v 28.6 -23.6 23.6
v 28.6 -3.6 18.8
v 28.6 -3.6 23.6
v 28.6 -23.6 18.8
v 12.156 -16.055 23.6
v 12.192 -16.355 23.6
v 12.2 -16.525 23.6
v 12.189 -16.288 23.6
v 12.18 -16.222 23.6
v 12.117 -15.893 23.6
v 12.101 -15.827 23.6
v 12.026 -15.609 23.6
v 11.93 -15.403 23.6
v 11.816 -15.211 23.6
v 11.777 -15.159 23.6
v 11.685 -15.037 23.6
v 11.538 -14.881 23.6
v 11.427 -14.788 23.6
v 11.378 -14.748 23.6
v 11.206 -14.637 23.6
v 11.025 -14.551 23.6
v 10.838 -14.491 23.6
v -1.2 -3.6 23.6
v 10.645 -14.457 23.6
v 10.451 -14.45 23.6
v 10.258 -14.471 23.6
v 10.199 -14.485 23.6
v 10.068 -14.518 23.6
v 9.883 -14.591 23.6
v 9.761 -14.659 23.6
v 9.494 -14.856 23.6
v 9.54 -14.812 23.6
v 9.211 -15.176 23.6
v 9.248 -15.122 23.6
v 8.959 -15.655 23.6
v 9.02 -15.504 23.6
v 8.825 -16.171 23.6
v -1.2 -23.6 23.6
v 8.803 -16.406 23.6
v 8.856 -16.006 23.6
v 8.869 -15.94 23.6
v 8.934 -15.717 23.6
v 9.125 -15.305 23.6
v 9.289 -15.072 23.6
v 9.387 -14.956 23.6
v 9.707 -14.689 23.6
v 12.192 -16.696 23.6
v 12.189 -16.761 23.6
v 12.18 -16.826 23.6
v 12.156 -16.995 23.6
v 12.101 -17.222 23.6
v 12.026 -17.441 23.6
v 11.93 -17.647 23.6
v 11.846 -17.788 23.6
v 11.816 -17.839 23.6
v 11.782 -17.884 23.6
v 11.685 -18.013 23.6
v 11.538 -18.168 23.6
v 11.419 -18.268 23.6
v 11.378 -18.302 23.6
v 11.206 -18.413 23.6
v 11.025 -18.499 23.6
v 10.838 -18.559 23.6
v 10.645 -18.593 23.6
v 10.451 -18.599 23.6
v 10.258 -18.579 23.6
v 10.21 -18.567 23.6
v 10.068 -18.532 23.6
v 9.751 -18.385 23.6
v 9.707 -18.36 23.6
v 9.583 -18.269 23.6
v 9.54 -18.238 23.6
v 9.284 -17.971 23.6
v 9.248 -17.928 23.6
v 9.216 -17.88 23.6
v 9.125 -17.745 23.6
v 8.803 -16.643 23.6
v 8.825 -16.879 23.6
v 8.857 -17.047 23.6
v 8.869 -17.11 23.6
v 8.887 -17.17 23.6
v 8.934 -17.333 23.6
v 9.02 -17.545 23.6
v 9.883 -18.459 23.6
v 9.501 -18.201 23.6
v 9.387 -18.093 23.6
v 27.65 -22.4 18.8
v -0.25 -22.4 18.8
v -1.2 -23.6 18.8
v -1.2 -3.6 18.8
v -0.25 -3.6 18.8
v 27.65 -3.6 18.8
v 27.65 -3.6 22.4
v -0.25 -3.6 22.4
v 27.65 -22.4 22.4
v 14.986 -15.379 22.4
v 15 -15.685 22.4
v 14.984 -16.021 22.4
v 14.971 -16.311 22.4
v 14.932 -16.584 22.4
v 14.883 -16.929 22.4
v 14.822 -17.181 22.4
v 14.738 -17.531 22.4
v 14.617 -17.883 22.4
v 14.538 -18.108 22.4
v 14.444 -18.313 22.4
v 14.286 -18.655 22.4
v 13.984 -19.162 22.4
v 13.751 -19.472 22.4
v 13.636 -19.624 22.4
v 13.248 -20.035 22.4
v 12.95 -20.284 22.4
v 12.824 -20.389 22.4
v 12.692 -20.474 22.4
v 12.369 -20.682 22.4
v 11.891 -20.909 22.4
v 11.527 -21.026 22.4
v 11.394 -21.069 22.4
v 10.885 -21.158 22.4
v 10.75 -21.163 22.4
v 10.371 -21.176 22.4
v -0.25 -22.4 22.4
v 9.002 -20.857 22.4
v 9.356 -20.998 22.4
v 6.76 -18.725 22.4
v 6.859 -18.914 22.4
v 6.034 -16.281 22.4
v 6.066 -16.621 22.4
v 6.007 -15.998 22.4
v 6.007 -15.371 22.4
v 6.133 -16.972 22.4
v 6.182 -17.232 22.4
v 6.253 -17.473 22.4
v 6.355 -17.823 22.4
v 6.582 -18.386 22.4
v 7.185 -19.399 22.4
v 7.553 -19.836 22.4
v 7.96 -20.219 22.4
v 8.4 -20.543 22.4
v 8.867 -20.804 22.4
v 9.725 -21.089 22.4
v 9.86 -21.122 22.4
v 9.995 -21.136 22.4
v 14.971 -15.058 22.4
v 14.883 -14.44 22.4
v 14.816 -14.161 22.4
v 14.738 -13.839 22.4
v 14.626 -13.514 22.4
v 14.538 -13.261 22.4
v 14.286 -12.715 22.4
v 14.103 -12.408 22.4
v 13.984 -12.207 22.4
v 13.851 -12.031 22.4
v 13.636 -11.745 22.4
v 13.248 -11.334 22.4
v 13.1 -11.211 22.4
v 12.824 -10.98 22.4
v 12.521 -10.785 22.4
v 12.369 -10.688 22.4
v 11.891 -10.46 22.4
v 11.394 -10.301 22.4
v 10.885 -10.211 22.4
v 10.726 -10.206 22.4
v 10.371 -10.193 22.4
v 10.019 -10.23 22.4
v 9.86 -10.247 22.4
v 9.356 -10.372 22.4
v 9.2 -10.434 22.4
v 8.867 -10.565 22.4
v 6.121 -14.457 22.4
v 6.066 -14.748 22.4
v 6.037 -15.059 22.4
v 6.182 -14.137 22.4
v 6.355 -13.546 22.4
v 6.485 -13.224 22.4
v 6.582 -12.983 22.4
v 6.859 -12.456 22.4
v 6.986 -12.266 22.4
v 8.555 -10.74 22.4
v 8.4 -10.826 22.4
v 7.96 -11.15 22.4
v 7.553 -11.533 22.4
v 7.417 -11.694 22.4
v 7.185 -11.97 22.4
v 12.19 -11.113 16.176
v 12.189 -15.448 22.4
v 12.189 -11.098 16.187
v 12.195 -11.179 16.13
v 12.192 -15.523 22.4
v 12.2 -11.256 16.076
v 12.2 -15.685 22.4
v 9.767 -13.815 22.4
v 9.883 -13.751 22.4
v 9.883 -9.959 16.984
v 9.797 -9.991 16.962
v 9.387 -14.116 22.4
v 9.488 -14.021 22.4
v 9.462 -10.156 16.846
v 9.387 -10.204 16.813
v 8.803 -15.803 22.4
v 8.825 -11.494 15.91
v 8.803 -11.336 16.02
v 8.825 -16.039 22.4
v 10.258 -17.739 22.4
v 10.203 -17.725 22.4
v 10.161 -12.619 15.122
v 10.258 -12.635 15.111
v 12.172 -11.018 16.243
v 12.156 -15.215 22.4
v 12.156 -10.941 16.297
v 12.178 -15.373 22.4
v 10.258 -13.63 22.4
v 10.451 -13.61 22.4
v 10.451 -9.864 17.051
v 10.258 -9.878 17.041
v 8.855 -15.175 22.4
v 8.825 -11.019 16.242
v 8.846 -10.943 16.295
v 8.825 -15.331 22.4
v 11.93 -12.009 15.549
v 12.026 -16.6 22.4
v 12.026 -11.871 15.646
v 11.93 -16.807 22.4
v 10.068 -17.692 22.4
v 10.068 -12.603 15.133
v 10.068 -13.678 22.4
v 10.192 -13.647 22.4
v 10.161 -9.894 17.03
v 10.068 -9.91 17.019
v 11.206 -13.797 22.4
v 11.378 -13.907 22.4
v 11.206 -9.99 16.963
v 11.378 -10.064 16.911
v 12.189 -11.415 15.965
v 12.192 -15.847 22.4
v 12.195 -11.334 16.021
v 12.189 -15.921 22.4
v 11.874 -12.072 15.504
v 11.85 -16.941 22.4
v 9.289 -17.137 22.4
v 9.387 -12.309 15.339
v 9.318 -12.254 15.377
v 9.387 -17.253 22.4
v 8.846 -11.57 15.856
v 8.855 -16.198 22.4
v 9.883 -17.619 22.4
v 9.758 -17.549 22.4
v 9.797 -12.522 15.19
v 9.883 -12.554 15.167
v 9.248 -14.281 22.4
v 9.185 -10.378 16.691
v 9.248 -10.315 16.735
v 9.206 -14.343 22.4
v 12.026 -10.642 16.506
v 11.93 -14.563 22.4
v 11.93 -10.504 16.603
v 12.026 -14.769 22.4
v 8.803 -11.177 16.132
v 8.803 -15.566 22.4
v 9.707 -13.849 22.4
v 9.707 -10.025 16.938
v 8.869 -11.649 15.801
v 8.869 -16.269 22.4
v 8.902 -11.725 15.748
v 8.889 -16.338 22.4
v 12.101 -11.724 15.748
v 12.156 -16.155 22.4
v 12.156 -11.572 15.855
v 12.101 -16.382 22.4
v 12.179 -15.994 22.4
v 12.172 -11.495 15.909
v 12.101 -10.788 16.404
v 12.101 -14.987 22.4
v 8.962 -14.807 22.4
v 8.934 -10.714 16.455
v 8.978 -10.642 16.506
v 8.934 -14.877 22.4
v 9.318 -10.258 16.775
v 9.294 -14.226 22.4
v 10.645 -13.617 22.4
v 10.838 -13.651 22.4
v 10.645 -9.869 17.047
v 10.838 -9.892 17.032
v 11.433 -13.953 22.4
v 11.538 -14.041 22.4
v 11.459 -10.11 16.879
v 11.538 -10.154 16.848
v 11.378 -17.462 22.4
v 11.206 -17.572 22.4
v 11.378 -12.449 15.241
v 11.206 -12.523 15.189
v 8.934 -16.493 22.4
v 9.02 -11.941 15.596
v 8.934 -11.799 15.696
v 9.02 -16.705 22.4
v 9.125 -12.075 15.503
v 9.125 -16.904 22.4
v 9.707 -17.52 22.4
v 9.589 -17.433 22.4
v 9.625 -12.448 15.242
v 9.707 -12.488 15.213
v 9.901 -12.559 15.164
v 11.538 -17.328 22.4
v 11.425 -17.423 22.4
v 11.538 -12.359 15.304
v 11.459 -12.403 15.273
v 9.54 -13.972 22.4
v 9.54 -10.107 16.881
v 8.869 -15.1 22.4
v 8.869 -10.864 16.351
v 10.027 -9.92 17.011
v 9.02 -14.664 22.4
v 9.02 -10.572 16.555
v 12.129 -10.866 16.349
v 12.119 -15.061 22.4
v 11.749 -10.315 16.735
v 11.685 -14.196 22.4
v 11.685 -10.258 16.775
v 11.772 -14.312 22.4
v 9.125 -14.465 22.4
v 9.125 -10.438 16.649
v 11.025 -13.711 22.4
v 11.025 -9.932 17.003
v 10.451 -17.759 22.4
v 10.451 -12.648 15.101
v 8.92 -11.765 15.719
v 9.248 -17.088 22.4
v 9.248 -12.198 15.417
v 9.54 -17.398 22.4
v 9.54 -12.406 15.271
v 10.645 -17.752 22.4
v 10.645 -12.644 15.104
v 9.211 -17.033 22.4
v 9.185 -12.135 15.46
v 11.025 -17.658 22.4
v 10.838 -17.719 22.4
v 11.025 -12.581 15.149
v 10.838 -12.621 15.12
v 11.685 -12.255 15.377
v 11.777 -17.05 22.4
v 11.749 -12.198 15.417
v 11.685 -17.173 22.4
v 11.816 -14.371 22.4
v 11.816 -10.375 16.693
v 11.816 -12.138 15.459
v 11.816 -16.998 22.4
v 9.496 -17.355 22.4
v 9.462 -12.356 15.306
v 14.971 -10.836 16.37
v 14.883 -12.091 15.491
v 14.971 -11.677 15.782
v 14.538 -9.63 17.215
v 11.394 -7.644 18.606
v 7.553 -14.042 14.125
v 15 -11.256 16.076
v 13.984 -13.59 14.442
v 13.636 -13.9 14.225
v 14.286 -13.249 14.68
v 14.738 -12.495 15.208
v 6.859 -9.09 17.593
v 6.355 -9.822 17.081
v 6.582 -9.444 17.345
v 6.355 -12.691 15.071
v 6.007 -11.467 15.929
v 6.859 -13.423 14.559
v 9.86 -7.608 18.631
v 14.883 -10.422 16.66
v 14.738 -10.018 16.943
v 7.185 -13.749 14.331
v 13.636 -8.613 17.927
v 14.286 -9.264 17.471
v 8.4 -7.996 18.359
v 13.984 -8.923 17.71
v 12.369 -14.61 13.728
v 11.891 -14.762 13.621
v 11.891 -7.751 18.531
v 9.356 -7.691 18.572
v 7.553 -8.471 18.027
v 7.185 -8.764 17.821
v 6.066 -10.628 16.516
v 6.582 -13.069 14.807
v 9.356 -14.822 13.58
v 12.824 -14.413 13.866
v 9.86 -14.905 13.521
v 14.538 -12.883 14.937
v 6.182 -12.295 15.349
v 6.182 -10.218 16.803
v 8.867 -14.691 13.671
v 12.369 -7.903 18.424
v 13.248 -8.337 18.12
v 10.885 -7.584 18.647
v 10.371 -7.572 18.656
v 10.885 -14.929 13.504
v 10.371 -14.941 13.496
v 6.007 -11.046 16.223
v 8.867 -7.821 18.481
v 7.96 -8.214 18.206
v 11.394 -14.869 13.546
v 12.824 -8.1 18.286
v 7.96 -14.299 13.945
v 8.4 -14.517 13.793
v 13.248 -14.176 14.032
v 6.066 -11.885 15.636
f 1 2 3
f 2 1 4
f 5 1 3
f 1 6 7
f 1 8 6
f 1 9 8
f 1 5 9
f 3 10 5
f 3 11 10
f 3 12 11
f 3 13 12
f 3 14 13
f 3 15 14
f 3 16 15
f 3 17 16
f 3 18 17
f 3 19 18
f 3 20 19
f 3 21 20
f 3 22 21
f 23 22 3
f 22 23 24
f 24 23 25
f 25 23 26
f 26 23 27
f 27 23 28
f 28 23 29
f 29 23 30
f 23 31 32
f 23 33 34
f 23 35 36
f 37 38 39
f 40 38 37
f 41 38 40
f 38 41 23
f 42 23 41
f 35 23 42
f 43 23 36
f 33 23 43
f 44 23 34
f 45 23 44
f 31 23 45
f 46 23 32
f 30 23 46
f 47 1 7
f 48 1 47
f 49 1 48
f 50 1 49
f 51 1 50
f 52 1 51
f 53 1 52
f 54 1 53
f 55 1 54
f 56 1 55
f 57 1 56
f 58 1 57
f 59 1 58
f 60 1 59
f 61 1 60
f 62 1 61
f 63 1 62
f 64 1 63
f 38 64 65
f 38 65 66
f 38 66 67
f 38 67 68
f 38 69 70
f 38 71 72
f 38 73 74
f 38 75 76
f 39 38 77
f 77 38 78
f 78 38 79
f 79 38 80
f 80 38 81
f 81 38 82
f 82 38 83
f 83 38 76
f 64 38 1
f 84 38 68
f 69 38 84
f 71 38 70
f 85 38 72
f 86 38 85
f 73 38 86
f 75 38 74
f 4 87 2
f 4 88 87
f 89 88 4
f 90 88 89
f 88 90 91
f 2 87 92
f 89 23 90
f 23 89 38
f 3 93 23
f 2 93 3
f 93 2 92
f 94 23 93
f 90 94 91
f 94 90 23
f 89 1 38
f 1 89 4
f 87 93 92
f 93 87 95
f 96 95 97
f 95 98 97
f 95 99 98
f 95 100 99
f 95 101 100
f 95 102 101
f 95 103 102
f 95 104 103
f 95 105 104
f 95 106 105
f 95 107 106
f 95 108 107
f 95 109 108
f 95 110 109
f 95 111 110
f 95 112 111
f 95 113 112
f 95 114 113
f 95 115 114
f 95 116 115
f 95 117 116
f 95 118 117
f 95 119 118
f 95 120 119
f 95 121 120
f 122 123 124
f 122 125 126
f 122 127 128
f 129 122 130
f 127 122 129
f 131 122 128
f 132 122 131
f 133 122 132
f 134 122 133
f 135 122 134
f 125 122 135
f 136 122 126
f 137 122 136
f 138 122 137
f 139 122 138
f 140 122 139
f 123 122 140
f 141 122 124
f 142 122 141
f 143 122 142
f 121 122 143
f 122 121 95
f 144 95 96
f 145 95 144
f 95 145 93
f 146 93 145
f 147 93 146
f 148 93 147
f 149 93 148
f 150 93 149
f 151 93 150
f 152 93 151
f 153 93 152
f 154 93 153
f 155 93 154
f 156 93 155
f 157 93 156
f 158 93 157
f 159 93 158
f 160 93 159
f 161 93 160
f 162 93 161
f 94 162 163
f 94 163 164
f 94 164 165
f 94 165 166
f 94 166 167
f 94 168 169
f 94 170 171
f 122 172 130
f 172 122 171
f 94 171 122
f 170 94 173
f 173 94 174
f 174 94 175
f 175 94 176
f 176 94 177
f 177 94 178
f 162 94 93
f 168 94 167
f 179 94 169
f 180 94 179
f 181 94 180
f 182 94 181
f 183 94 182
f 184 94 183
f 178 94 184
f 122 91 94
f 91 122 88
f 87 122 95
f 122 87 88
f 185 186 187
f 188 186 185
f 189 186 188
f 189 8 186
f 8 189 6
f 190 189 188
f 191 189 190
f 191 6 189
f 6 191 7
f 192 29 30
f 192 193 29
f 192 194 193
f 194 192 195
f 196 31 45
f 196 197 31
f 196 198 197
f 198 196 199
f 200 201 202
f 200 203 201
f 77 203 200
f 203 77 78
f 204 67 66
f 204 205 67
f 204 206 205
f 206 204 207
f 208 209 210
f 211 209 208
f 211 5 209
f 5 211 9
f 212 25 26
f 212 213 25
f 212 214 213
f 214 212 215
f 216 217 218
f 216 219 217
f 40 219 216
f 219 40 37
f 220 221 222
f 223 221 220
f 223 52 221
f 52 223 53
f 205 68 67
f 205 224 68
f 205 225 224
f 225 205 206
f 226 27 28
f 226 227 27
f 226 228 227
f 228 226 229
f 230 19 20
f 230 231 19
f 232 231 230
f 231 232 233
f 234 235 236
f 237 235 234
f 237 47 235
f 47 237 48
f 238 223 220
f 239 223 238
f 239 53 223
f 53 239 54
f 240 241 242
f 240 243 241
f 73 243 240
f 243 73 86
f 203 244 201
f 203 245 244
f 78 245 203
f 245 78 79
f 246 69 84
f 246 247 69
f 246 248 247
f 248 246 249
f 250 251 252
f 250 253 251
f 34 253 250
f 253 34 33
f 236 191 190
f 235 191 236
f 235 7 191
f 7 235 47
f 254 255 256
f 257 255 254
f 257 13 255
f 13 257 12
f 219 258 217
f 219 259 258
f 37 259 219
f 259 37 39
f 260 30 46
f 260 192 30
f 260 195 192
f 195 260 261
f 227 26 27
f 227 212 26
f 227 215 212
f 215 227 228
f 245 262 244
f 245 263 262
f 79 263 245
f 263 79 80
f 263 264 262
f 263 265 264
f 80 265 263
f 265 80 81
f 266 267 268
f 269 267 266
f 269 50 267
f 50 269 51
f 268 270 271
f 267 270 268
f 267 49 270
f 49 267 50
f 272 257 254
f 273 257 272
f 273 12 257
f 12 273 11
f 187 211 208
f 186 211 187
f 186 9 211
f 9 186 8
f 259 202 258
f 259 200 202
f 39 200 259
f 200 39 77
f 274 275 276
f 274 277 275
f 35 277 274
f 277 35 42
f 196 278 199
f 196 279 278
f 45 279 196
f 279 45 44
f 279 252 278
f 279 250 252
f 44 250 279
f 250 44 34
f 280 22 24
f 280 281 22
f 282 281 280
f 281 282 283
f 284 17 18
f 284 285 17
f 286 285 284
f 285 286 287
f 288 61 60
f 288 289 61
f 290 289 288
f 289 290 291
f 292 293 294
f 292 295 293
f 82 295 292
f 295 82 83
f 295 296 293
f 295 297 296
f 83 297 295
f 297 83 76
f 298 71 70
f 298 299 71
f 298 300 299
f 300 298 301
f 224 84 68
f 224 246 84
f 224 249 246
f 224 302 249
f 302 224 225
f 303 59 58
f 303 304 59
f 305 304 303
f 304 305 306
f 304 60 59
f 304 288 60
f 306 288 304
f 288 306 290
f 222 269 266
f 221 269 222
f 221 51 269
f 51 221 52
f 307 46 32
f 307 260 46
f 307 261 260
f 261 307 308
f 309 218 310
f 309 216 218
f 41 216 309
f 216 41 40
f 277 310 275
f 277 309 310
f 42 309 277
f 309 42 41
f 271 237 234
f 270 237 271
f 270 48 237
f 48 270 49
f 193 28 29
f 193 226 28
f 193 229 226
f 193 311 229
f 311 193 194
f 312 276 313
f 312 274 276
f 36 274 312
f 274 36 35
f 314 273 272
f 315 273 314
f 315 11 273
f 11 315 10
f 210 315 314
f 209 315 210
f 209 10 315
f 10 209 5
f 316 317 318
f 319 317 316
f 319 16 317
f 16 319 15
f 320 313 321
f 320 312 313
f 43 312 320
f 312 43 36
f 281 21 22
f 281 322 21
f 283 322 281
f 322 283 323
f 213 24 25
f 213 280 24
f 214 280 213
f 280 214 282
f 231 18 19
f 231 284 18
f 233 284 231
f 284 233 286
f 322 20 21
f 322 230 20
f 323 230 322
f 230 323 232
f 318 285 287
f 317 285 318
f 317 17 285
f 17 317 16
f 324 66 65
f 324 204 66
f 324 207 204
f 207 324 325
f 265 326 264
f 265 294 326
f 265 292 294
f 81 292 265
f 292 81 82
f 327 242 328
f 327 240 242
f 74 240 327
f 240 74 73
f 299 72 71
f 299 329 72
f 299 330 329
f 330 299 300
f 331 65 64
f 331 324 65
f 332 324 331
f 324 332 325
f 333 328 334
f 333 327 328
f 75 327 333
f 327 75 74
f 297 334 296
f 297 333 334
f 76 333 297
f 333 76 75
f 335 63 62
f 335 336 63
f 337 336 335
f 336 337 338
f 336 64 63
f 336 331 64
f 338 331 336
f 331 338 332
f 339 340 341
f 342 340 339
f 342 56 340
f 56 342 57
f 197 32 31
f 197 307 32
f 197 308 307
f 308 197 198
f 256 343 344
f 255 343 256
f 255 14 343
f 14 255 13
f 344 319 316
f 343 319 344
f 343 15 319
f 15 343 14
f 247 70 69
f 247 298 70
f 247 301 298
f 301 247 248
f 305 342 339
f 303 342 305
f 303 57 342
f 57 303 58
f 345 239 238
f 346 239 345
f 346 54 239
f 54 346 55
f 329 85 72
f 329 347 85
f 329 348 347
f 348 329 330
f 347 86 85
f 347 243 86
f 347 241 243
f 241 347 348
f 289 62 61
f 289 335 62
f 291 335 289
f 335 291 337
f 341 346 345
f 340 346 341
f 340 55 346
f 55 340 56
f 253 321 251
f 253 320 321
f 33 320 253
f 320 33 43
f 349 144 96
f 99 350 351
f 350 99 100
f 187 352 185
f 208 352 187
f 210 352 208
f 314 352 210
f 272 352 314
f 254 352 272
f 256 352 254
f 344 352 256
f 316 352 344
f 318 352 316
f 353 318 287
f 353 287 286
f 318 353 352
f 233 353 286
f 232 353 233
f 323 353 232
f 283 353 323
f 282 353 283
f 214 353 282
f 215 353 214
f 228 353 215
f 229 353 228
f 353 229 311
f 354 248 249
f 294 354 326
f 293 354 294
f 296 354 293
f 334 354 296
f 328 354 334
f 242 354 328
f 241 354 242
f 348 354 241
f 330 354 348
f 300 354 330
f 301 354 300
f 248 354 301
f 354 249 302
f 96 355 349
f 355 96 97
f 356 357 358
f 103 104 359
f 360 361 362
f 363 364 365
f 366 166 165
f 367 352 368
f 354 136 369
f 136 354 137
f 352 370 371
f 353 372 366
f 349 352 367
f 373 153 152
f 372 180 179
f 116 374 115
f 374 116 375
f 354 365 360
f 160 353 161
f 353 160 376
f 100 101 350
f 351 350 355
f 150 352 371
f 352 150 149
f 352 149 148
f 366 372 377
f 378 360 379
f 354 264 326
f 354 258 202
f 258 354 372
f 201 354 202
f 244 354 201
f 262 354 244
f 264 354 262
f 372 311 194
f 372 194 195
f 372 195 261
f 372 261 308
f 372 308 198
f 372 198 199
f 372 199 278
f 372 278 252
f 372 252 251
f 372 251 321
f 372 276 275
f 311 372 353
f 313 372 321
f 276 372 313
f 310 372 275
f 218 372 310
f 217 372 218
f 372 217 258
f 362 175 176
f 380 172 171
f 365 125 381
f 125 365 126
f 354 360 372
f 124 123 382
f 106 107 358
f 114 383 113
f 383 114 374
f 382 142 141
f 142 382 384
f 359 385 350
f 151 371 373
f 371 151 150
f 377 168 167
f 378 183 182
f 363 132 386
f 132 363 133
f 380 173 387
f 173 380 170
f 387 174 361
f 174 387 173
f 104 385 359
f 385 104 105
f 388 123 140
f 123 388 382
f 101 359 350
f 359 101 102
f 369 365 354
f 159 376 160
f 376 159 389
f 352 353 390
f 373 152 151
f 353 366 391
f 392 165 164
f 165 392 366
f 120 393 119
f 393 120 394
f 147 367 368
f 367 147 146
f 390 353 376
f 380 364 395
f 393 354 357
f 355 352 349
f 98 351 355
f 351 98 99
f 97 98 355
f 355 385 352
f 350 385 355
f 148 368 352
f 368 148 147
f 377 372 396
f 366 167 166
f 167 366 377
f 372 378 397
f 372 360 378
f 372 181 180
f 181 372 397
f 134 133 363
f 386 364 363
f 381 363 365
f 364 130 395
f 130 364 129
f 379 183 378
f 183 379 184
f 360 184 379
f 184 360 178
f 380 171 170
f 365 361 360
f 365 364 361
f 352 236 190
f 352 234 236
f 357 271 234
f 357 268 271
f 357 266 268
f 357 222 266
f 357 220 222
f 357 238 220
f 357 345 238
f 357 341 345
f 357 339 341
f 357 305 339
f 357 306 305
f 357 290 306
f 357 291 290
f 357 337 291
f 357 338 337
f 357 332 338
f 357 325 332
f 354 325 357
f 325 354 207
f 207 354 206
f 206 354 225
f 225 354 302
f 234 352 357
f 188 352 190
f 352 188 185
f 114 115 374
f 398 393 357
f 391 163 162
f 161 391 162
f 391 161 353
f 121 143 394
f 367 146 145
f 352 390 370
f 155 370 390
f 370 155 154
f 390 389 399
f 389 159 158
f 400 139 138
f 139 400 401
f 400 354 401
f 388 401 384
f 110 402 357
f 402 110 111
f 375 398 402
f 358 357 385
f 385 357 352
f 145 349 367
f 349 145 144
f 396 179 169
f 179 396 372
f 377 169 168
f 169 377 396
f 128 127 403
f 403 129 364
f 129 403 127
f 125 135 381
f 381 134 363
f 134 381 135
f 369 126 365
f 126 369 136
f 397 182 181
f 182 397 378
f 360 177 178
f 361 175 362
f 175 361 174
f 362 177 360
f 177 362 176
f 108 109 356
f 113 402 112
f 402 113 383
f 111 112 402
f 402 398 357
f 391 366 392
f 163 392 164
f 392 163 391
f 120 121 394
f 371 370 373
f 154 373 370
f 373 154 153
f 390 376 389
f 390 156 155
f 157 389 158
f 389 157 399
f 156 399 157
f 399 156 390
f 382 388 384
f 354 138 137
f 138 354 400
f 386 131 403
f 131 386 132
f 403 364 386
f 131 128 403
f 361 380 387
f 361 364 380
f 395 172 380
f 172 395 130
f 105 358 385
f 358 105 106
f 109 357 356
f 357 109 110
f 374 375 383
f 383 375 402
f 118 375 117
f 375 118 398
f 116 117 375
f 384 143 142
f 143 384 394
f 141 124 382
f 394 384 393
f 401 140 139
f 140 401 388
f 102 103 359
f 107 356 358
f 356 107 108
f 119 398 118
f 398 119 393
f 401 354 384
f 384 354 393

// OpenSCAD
//======================================================================
// Seeder.scad
// 
// A multi-row seeder for microgreens in a standard 10x20 inch tray.
//
// DrTomFlint 13 Jan 2024
//======================================================================

use <../Gears/gears.scad>

r0 = 20;    // radius disks
r1 = 20.5;  // radius of tub cuts

r3 = 1.5;     // radius of axle

r4 = 4;     // radius of outlet 
ang1 = 35;  // rotation of popout to match outlet

r5 = 5;  // radius of popout

x0 = 2;     // thickness of disks
x1 = 25;    // thickness at top of tub

thick = 1.2;  // thickness of tub walls

d0 = 0.5;     // gap between disk and tub

$fn=55;

//----------------------------------------------------------------------
module tub(){

  difference(){
    union(){
      // main bin
      hull(){
        rotate([0,90,0])
        cylinder(r=r1+thick,h=x0+d0+thick+1);
        
        translate([0,-r1-thick,r1])
        cube([x1+2*thick,2*r1+2*thick,2]);
      }
      // exit hole 
      translate([-thick-1.5,-r1/2,3])
      rotate([0,30,0])
      cylinder(r1=r4+thick-2,r2=r4+thick,h=16);              
      // downpipe
      translate([-thick-1,-r1/2,-25.5])
      cylinder(r=r4+thick-2,h=30);              
    }
    
    // main bin cut
    hull(){
      translate([thick,0,0])
      rotate([0,90,0])
      cylinder(r=r1-thick,h=x0+d0+1);
      
      translate([thick,-r1,r1])
      cube([x1,2*r1,3]);
    }

    // exit hole cut
    translate([-thick-1.5,-r1/2,3])
    rotate([0,30,0])
    cylinder(r1=r4-2,r2=r4,h=16.1);              
    // downpipe cut
    translate([-thick-1,-r1/2,-25.5])
    cylinder(r=r4-1.75,h=30);              
    
    // axle cut
    translate([0,0,0])
    rotate([0,90,0])
    cylinder(r=r3+0.15,h=2*x1,center=true);
    
  }
  
}

//----------------------------------------------------------------------
module disk(N=5,rs=1){

  difference(){
    // main disk
    rotate([0,90,0]){
      cylinder(r=r0-thick, h=x0);
    }  

    // axle cut
    translate([0,0,0])
    rotate([0,90,0])
    cylinder(r=r3+0.15,h=2*x1,center=true);
  
    // scoop cuts
    for(i=[0:N-1]){
      rotate([360/N*i-15,0,0])
      translate([x0/2,r0-rs-2.5,0])
      rotate([0,-45,0])
      cylinder(r1=2.0*rs,r2=1.0*rs,h=4*x0,center=true);

      rotate([360/N*i-36,0,0])
      translate([x0/2+1.8,r0-rs-0,0])
      rotate([30,-5,0])
      rotate([0,-90,0])
      scale([1.5,0.8,1])
      cylinder(r=5,h=2,center=true);
    }
    

  }

}

//----------------------------------------------------------------------
module popout(N=5,rs=1){

rotate([ang1,0,0])
  translate([r5+5.5,0,r0-4.5]){
    difference(){
      // main disk
      rotate([0,0,0]){
        cylinder(r=r5, h=4);
      }  

      // axle cut
      translate([0,0,0])
      rotate([0,0,0])
      cylinder(r=1.7,h=10,center=true);


    }
    
    // popouts
    rotate([0,0,90])
    translate([0,0,2])
    for(i=[0:1]){
      rotate([360/2*i,0,0])
      translate([0,r5+2,0])
      rotate([0,0,0])
      rotate([90,0,0])
      scale([1.5,1,1])
      cylinder(r1=0.5*rs,r2=1.25*rs,h=6.0,center=true);
    }
  }  
  
}

//----------------------------------------------------------------------
module axle(){

  difference(){
    rotate([0,90,0])
    cylinder(r1=r3-0.1,r2=r3+0.1,h=2*x1,center=true);
    
    translate([0,0,-5-r3+0.3])
    cube([100,100,10],center=true);
  }
}

//----------------------------------------------------------------------
module axle2(){

  difference(){
    rotate([ang1,0,0])
    union(){
      translate([r5+5.5,0,x1-3])
      cylinder(r=r3,h=x1+15,center=true);
      hull(){
        translate([8.75,0,0])
        rotate([0,90,0])
        cylinder(r=r3+1,h=5.5,center=true);
        translate([8.75+1.75,0,6])
        rotate([0,90,0])
        cylinder(r=r3,h=2,center=true);
      }
    }
    
    // axle cut
    rotate([0,90,0])
    cylinder(r=r3+0.2,h=2*x1,center=true);

    tub();
    
    // printable flat
    translate([50+11.5,0,0])
    cube([100,100,100],center=true);
  }
}

//----------------------------------------------------------------------
module cap(){

  difference(){
    translate([(x1+4*thick)/2-thick,-r0/2-3*thick,r0+thick])
    cube([x1+4*thick,20,4*thick],center=true);

    // main cut
    translate([(x1+4*thick)/2-thick,-r0/2-2*thick,r0])
    cube([x1+2*thick+0.5,20,4*thick],center=true);

    // cut for axle2
    rotate([ang1,0,0])
    translate([r5+5.5,0,x1-5])
    cylinder(r=r3+0.2,h=x1+15,center=true);

  }

  difference(){

    // collar
    rotate([ang1,0,0])
    translate([r5+5.5,0,x1+2])
    cylinder(r=r3+3,h=14.75,center=true);

    // cut for axle2
    rotate([ang1,0,0])
    translate([r5+5.5,0,x1-5])
    cylinder(r=r3+0.2,h=x1+15,center=true);

    // cut collar off flat
    translate([(x1+4*thick)/2-thick,-r0/2-3*thick,r0+8.5])
    cube([x1+4*thick,20,10],center=true);
  }
  
}


//======================================================================
// diskA is default

// gear for modeling
//~ rotate([ang1,0,0])
//~ translate([x0+1.4,0,0])
//~ rotate([0,90,0])
//~ bevel_gear_pair(modul=1, gear_teeth=12*2.5, pinion_teeth=12, axis_angle=90, tooth_width=5, gear_bore=r3*2+0.2, pinion_bore=r3*2+0.2, pressure_angle = 20, helix_angle=20, together_built=true);

// gear for printing
//~ bevel_gear_pair(modul=1, gear_teeth=12*2.5, pinion_teeth=12, axis_angle=90, tooth_width=5, gear_bore=r3*2+0.2, pinion_bore=r3*2+0.2, pressure_angle = 20, helix_angle=0, together_built=false);

//~ tub();

cap();

//~ translate([thick+0.2,0,0])
//~ disk();

//~ popout();

//~ axle();

//~ axle2();


//======================================================================
